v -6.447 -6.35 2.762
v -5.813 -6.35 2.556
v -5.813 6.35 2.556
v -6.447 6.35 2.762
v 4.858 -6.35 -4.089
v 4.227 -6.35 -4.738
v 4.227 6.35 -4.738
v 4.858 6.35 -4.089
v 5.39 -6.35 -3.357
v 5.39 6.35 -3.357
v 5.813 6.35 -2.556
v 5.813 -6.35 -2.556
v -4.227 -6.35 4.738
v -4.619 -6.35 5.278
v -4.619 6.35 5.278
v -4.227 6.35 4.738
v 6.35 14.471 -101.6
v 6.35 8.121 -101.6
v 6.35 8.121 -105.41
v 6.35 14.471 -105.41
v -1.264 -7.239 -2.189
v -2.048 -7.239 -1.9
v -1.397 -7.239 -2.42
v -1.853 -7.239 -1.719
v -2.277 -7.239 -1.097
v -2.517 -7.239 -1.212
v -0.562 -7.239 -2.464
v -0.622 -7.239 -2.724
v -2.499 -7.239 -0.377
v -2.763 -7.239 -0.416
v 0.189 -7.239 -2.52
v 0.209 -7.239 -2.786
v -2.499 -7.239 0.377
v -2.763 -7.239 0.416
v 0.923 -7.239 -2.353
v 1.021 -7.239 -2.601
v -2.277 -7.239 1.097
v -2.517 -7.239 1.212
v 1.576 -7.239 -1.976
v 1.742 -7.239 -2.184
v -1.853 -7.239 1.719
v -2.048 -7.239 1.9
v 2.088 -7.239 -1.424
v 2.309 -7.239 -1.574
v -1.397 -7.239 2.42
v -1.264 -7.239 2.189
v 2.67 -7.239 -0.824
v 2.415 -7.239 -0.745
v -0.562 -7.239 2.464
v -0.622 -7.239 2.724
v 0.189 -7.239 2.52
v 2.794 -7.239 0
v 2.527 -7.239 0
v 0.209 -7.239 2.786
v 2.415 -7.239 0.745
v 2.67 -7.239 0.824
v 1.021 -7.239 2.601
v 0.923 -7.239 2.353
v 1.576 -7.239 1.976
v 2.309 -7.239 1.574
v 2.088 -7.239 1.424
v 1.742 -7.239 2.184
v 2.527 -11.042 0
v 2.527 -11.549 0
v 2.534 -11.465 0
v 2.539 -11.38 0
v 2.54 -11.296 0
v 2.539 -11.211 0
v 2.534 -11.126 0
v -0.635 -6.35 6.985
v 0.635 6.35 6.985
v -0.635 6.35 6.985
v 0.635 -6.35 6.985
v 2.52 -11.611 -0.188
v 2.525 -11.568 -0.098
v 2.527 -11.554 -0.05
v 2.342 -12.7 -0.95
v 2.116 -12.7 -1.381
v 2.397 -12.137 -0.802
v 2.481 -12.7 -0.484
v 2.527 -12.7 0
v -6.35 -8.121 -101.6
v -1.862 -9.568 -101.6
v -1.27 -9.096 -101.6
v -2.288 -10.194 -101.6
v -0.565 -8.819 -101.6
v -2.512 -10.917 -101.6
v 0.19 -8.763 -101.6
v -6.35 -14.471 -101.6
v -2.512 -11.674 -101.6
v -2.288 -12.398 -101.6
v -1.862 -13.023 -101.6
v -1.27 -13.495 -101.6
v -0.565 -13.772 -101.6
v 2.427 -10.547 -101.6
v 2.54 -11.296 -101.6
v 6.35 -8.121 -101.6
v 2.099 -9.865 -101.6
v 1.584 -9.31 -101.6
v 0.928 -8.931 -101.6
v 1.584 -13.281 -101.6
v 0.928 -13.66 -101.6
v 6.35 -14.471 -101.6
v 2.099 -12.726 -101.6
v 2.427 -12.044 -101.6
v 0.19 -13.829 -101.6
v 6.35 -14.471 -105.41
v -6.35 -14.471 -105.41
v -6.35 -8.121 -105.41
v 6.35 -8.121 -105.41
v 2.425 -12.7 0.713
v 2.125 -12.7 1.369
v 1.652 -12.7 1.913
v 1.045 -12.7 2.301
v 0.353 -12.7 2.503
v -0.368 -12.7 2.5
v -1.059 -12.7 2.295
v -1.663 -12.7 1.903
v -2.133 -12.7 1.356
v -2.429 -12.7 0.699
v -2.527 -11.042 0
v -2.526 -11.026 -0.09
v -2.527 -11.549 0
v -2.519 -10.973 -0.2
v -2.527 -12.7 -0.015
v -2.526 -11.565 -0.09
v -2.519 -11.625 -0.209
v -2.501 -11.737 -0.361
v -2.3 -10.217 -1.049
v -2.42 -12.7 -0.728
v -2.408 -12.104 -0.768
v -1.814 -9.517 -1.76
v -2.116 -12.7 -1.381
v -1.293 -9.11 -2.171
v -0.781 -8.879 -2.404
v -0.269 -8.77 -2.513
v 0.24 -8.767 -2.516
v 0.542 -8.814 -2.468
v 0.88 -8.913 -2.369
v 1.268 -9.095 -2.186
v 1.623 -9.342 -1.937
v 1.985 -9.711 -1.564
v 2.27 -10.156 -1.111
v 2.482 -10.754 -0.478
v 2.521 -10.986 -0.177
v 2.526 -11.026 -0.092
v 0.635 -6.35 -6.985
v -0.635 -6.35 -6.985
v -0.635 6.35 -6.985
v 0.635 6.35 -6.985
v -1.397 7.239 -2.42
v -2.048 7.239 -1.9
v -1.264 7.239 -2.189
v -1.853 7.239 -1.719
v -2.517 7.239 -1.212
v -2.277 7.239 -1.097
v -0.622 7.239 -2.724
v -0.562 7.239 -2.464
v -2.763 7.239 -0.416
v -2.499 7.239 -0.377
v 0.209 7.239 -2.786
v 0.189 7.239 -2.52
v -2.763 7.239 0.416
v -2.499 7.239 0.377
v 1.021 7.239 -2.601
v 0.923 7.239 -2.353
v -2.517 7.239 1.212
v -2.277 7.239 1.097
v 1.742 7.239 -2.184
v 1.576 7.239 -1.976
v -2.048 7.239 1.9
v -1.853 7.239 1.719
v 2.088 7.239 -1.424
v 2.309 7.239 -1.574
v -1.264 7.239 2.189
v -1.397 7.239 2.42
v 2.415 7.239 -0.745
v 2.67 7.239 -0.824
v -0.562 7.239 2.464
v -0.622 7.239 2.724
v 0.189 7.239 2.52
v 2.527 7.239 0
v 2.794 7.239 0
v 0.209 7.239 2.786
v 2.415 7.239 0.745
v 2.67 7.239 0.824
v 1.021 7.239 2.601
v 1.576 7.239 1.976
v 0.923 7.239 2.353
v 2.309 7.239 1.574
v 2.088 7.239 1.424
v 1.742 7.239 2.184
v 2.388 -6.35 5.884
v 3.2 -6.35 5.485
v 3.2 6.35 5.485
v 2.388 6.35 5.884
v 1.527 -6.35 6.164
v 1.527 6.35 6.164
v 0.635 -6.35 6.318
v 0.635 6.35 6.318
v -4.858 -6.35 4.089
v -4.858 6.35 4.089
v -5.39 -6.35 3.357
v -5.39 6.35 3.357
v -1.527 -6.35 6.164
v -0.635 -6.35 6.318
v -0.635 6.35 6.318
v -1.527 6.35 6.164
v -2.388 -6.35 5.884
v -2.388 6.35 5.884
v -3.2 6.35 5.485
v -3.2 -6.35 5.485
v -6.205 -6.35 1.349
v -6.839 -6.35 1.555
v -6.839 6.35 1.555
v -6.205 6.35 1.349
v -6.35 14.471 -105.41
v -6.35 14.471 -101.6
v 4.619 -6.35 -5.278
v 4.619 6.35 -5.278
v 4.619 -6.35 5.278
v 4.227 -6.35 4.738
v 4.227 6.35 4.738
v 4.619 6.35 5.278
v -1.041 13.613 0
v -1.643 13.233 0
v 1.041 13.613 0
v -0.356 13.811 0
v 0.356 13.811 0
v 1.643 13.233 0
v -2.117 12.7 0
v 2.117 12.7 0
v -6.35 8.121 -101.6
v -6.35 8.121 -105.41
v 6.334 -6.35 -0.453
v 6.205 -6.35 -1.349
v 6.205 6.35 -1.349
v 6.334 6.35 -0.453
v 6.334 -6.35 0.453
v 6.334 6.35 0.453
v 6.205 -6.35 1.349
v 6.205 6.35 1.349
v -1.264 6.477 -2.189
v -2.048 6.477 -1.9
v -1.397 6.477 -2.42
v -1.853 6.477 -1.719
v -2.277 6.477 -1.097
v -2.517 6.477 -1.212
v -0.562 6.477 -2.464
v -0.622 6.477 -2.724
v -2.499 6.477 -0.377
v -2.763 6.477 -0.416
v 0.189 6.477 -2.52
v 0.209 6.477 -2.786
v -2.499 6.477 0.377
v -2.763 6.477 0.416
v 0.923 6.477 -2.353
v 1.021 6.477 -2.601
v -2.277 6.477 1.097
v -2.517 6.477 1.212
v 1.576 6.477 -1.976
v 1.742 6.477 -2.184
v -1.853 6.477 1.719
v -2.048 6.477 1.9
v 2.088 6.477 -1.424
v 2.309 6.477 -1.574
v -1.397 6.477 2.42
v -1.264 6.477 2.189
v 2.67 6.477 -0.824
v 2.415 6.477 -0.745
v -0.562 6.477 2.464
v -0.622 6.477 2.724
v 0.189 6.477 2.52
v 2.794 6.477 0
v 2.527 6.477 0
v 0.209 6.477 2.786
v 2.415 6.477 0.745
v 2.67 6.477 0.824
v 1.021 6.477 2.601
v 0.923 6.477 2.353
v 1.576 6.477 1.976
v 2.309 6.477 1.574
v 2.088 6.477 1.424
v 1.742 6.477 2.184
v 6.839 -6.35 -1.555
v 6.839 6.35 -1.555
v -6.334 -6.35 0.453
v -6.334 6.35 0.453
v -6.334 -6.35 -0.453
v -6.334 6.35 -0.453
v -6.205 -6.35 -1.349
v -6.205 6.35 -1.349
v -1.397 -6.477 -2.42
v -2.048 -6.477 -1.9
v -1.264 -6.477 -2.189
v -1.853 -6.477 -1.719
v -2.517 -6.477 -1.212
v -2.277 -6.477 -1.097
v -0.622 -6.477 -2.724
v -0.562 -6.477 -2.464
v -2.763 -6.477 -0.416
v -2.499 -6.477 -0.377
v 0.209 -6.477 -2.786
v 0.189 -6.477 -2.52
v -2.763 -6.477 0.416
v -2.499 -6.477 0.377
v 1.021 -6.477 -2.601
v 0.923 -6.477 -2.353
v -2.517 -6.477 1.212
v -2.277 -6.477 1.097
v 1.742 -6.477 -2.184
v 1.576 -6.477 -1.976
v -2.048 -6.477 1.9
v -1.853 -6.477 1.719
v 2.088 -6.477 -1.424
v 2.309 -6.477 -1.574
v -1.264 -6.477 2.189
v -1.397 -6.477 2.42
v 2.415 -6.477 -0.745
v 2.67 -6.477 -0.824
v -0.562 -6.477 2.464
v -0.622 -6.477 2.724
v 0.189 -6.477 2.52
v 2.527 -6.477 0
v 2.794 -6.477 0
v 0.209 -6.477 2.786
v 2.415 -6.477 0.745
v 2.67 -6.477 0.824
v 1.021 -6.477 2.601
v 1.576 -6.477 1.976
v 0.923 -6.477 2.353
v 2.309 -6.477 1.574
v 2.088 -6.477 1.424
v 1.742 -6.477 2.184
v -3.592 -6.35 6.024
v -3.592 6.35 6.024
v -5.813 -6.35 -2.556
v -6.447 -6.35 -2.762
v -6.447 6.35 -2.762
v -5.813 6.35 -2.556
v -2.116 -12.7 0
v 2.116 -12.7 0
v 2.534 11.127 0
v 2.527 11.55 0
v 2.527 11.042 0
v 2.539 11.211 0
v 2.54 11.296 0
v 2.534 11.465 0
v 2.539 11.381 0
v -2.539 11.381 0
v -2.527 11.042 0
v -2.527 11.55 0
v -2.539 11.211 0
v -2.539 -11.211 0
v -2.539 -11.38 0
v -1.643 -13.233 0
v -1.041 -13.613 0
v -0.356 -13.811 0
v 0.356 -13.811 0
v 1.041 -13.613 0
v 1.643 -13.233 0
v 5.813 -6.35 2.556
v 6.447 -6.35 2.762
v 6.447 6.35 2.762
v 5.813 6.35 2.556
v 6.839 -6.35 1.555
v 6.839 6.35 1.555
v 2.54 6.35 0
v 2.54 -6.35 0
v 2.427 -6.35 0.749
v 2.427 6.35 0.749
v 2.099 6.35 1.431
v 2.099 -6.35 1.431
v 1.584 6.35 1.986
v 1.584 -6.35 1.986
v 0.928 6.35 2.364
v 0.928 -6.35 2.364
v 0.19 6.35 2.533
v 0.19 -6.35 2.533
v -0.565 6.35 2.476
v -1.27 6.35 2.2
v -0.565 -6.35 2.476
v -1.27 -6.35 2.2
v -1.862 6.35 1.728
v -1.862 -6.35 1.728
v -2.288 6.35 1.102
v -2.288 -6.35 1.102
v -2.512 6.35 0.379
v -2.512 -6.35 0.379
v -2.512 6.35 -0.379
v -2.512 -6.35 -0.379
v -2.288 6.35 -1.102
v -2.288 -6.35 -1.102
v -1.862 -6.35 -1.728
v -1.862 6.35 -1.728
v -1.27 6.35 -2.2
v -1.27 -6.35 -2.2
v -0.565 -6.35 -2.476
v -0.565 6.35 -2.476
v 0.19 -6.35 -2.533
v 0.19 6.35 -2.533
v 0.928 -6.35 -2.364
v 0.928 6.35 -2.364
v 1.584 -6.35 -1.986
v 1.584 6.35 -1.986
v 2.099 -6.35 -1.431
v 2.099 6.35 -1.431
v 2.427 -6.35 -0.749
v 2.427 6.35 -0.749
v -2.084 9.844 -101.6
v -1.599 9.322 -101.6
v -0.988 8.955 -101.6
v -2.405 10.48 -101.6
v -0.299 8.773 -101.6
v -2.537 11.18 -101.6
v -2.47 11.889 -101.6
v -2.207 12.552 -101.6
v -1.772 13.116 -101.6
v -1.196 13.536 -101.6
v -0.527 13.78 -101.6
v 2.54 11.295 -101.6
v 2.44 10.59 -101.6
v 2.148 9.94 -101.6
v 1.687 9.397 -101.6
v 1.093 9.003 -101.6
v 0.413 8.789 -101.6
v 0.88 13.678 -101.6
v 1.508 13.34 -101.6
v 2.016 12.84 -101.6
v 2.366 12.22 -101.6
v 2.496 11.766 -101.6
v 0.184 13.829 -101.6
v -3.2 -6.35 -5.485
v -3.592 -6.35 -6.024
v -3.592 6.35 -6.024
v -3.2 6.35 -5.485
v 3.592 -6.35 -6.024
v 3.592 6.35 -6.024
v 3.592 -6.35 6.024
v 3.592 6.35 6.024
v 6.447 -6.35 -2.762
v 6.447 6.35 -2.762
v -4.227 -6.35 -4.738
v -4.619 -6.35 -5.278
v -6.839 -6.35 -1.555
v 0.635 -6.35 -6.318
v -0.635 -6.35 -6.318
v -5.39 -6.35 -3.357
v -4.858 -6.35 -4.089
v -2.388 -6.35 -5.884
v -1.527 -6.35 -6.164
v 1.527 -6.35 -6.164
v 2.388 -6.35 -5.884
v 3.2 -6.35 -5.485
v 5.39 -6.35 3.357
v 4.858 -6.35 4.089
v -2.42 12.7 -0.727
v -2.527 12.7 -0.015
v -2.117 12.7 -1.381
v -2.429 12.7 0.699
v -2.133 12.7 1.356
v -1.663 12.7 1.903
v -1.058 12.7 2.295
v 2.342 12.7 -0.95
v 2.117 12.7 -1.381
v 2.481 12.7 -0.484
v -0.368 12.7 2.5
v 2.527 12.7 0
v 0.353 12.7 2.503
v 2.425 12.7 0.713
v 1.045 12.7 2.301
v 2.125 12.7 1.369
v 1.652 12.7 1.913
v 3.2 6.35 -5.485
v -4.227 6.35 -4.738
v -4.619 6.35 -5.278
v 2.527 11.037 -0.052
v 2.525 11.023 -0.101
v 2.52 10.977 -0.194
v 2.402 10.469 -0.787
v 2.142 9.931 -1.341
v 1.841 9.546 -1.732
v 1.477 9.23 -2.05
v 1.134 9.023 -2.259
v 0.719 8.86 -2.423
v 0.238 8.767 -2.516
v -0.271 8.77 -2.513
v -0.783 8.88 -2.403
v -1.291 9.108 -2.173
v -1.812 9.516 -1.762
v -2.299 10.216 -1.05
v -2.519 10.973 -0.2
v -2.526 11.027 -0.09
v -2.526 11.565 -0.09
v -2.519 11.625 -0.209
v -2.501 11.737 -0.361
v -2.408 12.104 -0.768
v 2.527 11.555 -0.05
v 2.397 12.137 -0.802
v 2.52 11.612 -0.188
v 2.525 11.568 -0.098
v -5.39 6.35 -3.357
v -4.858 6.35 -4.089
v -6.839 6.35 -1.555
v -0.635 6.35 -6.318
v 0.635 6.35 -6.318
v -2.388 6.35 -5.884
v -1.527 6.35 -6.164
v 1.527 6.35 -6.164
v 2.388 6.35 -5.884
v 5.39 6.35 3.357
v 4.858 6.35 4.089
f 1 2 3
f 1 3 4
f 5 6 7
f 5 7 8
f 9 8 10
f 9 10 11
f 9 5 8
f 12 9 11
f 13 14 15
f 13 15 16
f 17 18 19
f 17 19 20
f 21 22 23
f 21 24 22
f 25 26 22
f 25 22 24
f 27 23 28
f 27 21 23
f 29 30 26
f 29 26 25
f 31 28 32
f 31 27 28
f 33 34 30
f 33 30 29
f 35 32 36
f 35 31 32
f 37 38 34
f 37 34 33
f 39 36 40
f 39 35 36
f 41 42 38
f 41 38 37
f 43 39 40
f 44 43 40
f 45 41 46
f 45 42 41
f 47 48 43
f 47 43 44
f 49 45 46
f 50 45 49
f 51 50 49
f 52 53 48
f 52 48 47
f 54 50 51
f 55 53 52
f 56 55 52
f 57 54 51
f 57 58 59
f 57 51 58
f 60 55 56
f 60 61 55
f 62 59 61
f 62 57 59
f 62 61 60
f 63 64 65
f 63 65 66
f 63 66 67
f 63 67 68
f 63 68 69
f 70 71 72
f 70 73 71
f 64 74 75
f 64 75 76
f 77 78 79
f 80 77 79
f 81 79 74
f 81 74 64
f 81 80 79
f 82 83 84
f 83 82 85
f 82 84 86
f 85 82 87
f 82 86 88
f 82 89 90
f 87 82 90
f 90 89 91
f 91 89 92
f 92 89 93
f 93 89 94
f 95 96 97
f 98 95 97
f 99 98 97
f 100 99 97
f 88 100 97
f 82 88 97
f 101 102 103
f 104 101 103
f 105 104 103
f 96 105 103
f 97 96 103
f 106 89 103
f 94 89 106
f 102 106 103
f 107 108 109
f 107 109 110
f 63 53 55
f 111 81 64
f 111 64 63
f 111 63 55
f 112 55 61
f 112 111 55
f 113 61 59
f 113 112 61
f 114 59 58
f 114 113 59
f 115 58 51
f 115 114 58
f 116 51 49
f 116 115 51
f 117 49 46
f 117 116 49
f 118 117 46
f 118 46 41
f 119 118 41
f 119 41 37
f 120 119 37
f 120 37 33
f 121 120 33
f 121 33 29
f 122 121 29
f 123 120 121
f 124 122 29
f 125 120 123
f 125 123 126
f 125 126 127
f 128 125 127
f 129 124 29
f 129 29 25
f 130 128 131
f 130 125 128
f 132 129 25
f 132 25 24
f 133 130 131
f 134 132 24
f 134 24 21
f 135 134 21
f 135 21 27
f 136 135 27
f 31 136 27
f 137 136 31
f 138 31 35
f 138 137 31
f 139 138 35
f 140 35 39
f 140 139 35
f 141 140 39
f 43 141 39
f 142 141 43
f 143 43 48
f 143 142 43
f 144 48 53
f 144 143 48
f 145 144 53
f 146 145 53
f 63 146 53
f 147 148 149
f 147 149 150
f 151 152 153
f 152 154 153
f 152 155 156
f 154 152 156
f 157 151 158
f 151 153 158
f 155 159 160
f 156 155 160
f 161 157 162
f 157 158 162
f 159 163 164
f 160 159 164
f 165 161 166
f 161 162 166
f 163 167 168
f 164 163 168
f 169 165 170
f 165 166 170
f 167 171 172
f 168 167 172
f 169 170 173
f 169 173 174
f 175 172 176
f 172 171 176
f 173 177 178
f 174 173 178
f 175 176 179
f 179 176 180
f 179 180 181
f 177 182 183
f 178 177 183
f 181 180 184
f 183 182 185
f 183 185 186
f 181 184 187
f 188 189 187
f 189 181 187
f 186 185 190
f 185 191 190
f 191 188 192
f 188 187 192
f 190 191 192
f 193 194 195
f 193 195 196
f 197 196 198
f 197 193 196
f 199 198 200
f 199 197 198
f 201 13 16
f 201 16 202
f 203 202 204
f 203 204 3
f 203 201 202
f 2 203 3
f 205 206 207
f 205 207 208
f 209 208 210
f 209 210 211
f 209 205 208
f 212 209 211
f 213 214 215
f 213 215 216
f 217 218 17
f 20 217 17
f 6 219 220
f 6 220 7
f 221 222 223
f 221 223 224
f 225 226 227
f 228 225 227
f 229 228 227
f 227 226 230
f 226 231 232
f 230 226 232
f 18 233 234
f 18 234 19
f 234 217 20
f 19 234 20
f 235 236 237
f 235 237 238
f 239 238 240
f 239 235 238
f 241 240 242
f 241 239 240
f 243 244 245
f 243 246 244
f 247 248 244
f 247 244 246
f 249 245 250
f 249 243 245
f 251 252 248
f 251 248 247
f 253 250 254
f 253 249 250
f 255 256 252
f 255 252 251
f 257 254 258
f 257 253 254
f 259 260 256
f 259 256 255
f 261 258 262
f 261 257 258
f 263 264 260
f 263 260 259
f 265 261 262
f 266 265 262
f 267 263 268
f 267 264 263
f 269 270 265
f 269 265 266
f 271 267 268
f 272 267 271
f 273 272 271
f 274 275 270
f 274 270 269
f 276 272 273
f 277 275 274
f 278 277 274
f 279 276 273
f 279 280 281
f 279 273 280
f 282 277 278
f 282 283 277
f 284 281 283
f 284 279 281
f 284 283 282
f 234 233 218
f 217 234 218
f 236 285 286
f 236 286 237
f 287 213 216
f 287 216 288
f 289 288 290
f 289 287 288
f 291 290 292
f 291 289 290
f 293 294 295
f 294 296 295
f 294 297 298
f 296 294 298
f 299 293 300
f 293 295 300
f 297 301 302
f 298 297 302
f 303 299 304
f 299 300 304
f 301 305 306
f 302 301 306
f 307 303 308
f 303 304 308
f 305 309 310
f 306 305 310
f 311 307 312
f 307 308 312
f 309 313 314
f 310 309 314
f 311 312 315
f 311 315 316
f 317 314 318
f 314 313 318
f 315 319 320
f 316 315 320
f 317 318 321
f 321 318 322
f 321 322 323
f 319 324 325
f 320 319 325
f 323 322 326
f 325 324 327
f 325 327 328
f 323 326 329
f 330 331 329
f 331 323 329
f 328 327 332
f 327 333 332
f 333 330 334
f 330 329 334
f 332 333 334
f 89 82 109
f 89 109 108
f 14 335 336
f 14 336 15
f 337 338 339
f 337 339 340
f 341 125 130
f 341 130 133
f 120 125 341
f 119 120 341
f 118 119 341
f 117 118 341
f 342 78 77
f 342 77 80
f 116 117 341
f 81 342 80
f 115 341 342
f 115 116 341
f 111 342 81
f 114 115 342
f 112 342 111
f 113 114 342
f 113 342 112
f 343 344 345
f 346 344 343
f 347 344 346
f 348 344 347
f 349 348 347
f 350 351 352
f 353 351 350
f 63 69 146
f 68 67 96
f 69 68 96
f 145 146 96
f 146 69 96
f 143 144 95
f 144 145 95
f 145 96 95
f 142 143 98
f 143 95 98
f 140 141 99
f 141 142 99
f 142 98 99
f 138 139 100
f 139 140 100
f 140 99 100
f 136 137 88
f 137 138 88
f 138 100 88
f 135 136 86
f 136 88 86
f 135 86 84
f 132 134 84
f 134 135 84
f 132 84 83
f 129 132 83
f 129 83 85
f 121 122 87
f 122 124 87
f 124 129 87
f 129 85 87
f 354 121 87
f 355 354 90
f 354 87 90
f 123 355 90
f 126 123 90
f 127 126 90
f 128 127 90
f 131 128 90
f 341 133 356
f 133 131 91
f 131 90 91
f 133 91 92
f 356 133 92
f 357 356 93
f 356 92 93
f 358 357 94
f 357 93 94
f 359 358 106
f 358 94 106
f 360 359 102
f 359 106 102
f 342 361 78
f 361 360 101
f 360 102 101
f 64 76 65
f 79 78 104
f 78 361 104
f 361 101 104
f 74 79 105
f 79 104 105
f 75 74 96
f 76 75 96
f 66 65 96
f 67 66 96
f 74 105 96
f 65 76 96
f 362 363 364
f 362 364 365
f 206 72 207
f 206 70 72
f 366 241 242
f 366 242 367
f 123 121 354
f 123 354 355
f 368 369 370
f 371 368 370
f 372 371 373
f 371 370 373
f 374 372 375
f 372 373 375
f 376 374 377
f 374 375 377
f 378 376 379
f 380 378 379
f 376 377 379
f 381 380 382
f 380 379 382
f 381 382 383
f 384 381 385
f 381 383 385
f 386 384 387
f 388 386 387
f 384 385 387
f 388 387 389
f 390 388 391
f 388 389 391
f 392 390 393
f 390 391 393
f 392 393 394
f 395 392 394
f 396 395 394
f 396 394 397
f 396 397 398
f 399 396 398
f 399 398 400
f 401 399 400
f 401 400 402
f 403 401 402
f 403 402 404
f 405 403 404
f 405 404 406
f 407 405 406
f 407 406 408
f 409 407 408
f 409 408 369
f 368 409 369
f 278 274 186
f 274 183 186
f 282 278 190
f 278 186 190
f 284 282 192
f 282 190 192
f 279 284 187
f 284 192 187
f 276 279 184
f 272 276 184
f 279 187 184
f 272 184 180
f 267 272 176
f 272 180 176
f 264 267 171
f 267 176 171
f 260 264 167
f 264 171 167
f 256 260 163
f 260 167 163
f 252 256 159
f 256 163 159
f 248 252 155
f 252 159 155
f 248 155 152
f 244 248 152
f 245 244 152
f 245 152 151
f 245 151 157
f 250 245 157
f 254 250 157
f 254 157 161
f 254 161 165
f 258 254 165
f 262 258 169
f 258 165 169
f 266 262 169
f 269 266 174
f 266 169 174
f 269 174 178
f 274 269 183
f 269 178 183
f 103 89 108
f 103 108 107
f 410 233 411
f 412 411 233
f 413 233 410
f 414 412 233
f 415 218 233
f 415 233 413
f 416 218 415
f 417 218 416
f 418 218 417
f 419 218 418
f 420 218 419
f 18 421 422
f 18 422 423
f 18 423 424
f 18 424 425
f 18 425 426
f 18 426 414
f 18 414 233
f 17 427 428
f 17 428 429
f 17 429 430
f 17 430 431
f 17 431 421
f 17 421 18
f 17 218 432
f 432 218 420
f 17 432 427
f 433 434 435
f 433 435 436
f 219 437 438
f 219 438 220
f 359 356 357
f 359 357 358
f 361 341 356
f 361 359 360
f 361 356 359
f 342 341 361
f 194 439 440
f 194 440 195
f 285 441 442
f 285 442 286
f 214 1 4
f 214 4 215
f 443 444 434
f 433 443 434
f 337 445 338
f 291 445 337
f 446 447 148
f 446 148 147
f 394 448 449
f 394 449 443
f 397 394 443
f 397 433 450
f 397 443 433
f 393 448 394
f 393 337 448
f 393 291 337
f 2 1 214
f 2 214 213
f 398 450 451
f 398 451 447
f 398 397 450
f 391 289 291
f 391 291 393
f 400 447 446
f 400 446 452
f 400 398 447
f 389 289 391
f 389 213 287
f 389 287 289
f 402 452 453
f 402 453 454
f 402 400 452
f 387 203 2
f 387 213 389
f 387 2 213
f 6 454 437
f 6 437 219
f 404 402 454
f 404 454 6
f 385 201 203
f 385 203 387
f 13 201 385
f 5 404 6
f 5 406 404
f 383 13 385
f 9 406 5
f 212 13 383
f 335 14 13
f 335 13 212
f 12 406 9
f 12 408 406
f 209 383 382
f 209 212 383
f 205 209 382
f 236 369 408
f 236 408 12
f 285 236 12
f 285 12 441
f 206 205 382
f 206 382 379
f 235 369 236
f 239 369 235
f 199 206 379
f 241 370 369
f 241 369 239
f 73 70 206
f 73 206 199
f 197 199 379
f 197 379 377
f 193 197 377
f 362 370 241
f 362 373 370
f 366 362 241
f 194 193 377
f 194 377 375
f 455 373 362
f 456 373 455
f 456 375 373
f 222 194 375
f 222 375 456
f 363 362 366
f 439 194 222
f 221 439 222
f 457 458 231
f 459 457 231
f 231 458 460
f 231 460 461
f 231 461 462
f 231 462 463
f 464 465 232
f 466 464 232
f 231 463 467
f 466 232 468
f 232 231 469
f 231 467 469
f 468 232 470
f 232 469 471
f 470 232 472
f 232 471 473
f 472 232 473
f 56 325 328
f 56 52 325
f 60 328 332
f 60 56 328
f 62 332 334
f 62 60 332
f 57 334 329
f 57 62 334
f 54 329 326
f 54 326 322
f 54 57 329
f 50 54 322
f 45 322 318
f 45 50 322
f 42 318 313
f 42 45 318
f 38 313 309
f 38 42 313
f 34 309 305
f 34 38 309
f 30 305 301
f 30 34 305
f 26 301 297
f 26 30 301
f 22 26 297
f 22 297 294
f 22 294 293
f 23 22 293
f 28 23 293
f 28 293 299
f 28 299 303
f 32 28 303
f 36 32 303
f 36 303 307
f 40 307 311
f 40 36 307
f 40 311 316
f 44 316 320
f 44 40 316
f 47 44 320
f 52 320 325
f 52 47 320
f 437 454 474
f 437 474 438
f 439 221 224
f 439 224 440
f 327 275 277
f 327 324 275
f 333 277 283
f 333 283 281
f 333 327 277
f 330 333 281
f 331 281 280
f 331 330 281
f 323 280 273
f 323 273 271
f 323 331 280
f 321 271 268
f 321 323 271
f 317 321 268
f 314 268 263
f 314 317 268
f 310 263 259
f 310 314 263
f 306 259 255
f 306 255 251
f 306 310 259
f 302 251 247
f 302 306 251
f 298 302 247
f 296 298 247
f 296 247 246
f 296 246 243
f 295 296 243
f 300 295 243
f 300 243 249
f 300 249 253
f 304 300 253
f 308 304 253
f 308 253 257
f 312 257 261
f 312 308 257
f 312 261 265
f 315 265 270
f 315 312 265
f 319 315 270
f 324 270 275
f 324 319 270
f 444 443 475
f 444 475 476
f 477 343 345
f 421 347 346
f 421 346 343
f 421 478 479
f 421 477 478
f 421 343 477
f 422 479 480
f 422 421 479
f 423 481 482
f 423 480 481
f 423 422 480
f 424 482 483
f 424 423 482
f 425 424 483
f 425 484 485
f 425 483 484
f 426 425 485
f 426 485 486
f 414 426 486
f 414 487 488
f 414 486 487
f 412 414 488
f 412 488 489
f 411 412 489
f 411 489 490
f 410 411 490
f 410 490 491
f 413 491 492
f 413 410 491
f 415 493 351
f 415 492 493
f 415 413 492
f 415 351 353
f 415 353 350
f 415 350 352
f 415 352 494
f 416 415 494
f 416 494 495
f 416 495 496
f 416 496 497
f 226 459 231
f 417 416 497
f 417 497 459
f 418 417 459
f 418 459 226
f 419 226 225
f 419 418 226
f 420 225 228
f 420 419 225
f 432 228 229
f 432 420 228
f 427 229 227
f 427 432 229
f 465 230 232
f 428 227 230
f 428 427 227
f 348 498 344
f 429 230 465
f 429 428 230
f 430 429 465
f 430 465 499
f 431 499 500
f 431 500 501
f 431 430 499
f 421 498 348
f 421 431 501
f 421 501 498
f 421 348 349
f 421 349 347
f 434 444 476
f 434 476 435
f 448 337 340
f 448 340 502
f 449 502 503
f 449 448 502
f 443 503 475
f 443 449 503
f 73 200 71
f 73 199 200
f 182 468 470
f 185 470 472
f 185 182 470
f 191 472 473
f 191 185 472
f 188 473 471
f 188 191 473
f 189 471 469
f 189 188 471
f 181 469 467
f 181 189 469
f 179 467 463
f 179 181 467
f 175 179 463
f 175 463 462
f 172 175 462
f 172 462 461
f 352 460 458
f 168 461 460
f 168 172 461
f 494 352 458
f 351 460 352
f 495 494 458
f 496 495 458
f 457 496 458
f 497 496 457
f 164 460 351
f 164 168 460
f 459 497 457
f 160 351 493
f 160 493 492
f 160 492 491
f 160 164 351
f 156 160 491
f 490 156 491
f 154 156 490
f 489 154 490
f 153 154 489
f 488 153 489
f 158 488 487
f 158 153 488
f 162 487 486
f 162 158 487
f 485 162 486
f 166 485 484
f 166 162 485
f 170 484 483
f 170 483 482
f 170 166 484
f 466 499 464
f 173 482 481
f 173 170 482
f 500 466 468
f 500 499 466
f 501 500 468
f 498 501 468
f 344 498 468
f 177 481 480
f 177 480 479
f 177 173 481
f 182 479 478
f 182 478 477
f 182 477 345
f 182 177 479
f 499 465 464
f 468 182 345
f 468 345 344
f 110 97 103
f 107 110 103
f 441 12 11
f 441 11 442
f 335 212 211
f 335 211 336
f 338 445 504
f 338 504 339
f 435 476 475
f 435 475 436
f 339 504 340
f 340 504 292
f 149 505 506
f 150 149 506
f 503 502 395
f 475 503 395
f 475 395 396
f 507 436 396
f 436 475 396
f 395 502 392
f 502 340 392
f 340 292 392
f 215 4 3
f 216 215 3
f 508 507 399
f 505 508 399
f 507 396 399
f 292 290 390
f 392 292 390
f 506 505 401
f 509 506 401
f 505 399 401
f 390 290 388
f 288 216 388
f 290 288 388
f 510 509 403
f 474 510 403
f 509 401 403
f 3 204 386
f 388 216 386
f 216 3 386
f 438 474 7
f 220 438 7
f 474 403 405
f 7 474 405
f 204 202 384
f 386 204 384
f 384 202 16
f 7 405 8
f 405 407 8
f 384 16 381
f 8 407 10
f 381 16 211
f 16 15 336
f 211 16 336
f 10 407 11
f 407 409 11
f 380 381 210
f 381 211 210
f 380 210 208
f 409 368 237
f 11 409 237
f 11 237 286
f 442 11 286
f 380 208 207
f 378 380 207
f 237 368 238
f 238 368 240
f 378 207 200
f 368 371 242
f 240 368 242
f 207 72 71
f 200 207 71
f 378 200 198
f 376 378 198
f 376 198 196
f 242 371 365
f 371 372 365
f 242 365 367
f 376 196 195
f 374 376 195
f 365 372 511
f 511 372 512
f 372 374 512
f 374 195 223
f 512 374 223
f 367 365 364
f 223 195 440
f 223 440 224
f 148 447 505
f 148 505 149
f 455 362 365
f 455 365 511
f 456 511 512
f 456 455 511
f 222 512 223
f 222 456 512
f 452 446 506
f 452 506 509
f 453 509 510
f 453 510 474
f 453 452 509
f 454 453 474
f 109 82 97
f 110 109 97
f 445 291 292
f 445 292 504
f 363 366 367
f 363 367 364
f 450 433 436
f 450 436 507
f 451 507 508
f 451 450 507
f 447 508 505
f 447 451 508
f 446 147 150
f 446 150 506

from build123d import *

# Parameters (mm, degrees)
F1_DEPTH  = 6.35
F2_R      = 2.54
F3_DEPTH  = 25.4
F4_R      = 2.5273
F5_DEPTH  = 12.7
F7_R      = 2.794
F8_DEPTH  = 0.381
F10_R     = 2.54
F11_DEPTH = 101.6
F12_W     = 12.7
F12_H     = 6.35
F13_DEPTH = 3.81


# Not quite as in the source:
# - a pattern or mirror of a feature is missing from the dataset's text; its kind, count and spacing are read off the source's solid


with BuildPart() as f1:
    # F0 (on Front) → F1 (new body, symmetric)
    with BuildSketch(Plane.XZ):
        with BuildLine():
            Line((-0.635, 6.985), (-0.635, 6.3181702256))
            ThreePointArc((-0.635, 6.3181702256), (-1.9622579143, 6.0392088785), (-3.2000014887, 5.4847507211))
            Line((-3.2000014887, 5.4847507211), (-3.5919541958, 6.0242273409))
            Line((-3.5919541958, 6.0242273409), (-4.6194057787, 5.2777400705))
            Line((-4.6194057787, 5.2777400705), (-4.2274530715, 4.7382634507))
            ThreePointArc((-4.2274530715, 4.7382634507), (-5.1372579143, 3.7324363521), (-5.8127111727, 2.5563428609))
            Line((-5.8127111727, 2.5563428609), (-6.4469039749, 2.7624045936))
            Line((-6.4469039749, 2.7624045936), (-6.8393555577, 1.5545628179))
            Line((-6.8393555577, 1.5545628179), (-6.2051627556, 1.3485010852))
            ThreePointArc((-6.2051627556, 1.3485010852), (-6.35, 0), (-6.2051627556, -1.3485010852))
            Line((-6.2051627556, -1.3485010852), (-6.8393555577, -1.5545628179))
            Line((-6.8393555577, -1.5545628179), (-6.4469039749, -2.7624045936))
            Line((-6.4469039749, -2.7624045936), (-5.8127111727, -2.5563428609))
            ThreePointArc((-5.8127111727, -2.5563428609), (-5.1372579143, -3.7324363521), (-4.2274530715, -4.7382634507))
            Line((-4.2274530715, -4.7382634507), (-4.6194057787, -5.2777400705))
            Line((-4.6194057787, -5.2777400705), (-3.5919541958, -6.0242273409))
            Line((-3.5919541958, -6.0242273409), (-3.2000014887, -5.4847507211))
            ThreePointArc((-3.2000014887, -5.4847507211), (-1.9622579143, -6.0392088785), (-0.635, -6.3181702256))
            Line((-0.635, -6.3181702256), (-0.635, -6.985))
            Line((-0.635, -6.985), (0.635, -6.985))
            Line((0.635, -6.985), (0.635, -6.3181702256))
            ThreePointArc((0.635, -6.3181702256), (1.9622579143, -6.0392088785), (3.2000014887, -5.4847507211))
            Line((3.2000014887, -5.4847507211), (3.5919541958, -6.0242273409))
            Line((3.5919541958, -6.0242273409), (4.6194057787, -5.2777400705))
            Line((4.6194057787, -5.2777400705), (4.2274530715, -4.7382634507))
            ThreePointArc((4.2274530715, -4.7382634507), (5.1372579143, -3.7324363521), (5.8127111727, -2.5563428609))
            Line((5.8127111727, -2.5563428609), (6.4469039749, -2.7624045936))
            Line((6.4469039749, -2.7624045936), (6.8393555577, -1.5545628179))
            Line((6.8393555577, -1.5545628179), (6.2051627556, -1.3485010852))
            ThreePointArc((6.2051627556, -1.3485010852), (6.35, 0), (6.2051627556, 1.3485010852))
            Line((6.2051627556, 1.3485010852), (6.8393555577, 1.5545628179))
            Line((6.8393555577, 1.5545628179), (6.4469039749, 2.7624045936))
            Line((6.4469039749, 2.7624045936), (5.8127111727, 2.5563428609))
            ThreePointArc((5.8127111727, 2.5563428609), (5.1372579143, 3.7324363521), (4.2274530715, 4.7382634507))
            Line((4.2274530715, 4.7382634507), (4.6194057787, 5.2777400705))
            Line((4.6194057787, 5.2777400705), (3.5919541958, 6.0242273409))
            Line((3.5919541958, 6.0242273409), (3.2000014887, 5.4847507211))
            ThreePointArc((3.2000014887, 5.4847507211), (1.9622579143, 6.0392088785), (0.635, 6.3181702256))
            Line((0.635, 6.3181702256), (0.635, 6.985))
            Line((0.635, 6.985), (-0.635, 6.985))
        make_face()
    extrude(amount=F1_DEPTH, both=True)

    # F2 (on face) → F3 (cut)
    with BuildSketch(Plane.XZ.offset(6.35)):
        Circle(F2_R)
    extrude(amount=-F3_DEPTH, mode=Mode.SUBTRACT)


with BuildPart() as f5:
    # F4 (on Front) → F5 (new body, symmetric)
    with BuildSketch(Plane.XZ):
        Circle(F4_R)
    extrude(amount=F5_DEPTH, both=True)

    # F7 (on offset) → F8 (join, symmetric)
    with BuildSketch(Plane.XZ.offset(6.858)):
        Circle(F7_R)
    f8 = extrude(amount=F8_DEPTH, both=True)

    # F8_copies: F8 across plane
    add(f8.mirror(Plane.ZX))

    # F10 (on offset) → F11 (join)
    with BuildSketch(Plane.XY.offset(-101.6)):
        with Locations((0, -11.2956358868)):
            Circle(F10_R)
    f11 = extrude(amount=F11_DEPTH)

    # F11_copies: F11 across plane
    add(f11.mirror(Plane(origin=(0, 0.000167, 0), x_dir=(0, 3e-06, 1), z_dir=(0, 1, -3e-06))))

    # F12 (on face) → F13 (join)
    with BuildSketch(Plane(origin=(0, 0, -101.6), x_dir=(1, 0, 0), z_dir=(0, 0, -1))):
        with Locations((0, 11.2956358868)):
            Rectangle(F12_W, F12_H)
    f13 = extrude(amount=F13_DEPTH)

    # F13_copies: F13 across plane
    add(f13.mirror(Plane.ZX))


solid = Compound([f1.part, f5.part])
